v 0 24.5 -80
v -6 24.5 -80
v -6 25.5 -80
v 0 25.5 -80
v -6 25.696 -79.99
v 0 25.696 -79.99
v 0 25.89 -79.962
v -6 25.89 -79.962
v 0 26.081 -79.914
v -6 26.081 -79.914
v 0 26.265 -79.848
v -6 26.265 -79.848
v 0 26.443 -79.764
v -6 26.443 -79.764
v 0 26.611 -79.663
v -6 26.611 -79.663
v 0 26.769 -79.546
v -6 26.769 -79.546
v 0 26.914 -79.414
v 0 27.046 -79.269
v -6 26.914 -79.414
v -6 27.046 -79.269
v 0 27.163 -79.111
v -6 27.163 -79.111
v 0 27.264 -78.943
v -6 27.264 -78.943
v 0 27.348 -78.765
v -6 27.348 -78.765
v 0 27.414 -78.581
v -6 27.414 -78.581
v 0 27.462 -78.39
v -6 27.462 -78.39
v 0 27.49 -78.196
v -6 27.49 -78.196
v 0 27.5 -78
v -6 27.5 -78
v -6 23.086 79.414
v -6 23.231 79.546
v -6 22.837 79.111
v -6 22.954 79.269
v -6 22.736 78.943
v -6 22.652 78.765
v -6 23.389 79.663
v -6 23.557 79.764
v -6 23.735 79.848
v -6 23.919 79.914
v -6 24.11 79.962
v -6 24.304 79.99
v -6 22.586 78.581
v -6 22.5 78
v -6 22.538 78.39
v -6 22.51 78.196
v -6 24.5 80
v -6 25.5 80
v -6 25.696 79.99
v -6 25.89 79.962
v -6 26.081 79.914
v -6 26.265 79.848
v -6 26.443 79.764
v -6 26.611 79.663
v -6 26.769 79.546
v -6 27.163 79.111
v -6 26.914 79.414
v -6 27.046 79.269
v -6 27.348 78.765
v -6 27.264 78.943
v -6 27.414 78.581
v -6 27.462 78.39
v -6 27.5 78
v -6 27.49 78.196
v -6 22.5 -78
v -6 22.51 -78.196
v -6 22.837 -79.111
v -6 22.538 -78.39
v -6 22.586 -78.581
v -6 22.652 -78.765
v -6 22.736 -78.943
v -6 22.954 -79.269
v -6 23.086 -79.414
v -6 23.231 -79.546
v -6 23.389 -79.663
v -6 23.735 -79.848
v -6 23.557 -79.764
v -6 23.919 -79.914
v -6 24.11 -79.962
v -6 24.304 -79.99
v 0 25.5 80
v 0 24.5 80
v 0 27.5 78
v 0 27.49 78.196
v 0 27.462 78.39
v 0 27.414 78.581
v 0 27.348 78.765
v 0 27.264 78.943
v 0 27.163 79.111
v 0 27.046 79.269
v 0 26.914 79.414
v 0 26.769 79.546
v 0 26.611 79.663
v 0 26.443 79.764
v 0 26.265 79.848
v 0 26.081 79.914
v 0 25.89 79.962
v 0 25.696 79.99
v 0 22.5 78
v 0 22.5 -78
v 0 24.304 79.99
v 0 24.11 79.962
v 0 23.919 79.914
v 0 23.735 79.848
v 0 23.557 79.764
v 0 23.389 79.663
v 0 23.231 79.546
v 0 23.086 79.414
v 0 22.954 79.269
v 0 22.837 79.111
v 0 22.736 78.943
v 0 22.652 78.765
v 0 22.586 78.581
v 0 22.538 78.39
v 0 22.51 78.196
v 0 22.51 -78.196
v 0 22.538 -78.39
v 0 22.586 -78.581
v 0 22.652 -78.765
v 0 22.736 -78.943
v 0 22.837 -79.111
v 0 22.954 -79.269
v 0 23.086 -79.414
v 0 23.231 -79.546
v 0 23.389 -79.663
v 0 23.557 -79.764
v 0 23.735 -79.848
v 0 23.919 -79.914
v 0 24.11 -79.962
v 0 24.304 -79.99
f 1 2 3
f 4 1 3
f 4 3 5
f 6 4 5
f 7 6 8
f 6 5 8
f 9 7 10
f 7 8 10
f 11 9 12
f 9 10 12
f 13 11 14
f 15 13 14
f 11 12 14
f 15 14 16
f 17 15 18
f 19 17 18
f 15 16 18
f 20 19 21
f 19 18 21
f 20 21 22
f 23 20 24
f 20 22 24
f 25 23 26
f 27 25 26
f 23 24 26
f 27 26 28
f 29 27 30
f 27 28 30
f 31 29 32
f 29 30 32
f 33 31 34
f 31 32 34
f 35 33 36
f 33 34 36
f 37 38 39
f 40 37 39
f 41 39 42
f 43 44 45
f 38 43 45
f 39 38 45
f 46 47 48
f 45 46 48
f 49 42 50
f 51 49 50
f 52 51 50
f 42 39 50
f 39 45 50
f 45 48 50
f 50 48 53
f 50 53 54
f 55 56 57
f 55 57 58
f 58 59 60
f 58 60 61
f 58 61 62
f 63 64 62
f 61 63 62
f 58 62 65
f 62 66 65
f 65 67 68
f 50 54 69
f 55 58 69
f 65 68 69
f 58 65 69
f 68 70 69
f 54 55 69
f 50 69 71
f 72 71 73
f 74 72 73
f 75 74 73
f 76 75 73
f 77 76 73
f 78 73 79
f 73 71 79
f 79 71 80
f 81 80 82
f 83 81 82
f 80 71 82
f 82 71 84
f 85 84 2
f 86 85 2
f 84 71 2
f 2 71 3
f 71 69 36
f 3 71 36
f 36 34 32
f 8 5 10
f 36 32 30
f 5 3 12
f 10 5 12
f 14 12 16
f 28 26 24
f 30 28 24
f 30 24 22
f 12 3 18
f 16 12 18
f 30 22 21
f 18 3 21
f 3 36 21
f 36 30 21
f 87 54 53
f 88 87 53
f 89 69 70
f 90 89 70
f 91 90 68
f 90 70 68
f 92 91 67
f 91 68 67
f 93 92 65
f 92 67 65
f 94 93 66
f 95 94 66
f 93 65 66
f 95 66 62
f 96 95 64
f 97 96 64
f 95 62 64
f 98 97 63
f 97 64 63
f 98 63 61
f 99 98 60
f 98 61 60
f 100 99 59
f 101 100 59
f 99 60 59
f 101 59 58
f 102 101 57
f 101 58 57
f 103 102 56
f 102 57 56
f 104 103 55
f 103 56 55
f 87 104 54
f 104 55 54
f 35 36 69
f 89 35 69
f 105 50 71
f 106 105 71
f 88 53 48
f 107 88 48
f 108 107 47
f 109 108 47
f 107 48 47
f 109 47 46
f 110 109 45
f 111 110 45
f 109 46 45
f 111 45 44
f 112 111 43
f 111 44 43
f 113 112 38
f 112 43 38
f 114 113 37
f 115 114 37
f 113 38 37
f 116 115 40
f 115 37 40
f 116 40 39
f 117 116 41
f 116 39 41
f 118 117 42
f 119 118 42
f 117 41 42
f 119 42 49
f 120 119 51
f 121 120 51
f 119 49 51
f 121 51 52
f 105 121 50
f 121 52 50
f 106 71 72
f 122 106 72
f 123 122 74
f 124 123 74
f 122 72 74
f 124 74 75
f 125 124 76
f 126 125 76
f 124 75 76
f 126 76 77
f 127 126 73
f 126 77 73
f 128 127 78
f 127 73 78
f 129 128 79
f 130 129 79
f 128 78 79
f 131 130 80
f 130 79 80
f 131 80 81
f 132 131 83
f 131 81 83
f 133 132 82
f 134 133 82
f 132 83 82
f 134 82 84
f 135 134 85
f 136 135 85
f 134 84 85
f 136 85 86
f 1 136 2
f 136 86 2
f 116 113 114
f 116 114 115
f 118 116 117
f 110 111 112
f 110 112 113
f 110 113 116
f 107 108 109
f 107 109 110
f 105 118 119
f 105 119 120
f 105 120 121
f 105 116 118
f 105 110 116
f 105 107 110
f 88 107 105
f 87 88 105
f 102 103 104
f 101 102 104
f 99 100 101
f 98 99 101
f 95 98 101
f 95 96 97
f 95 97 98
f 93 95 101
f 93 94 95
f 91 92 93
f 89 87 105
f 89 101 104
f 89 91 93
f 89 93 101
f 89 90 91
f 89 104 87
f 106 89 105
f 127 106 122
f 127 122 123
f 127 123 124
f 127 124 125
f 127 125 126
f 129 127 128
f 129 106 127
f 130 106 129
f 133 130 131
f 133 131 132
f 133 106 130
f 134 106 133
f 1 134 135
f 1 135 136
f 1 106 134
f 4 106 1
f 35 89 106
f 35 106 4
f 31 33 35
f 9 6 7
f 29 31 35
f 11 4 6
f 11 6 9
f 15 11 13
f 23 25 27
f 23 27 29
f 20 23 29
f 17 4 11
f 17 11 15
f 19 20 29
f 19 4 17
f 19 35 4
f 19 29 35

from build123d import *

# Parameters (mm, degrees)
BOSS_EXTRUDE1_START = -6
BOSS_EXTRUDE1_DEPTH = 6


with BuildPart() as part:
    # Boss-Extrude1: read off the stored shape, not the designer's step
    # Boss-Extrude1 outline → Boss-Extrude1 (new body)
    with BuildSketch(Plane(origin=(0, 22.5, 0), x_dir=(0, 0, -1), z_dir=(1, 0, 0)).offset(BOSS_EXTRUDE1_START)):
        with BuildLine():
            Line((-80, 3), (-80, 2))
            ThreePointArc((-80, 2), (-79.414213562, 0.585786438), (-78, 0))
            Line((-78, 0), (78, 0))
            ThreePointArc((78, 0), (79.414213562, 0.585786438), (80, 2))
            Line((80, 2), (80, 3))
            ThreePointArc((80, 3), (79.414213562, 4.414213562), (78, 5))
            Line((78, 5), (-78, 5))
            ThreePointArc((-78, 5), (-79.414213562, 4.414213562), (-80, 3))
        make_face()
    extrude(amount=BOSS_EXTRUDE1_DEPTH)


solid = part.part
